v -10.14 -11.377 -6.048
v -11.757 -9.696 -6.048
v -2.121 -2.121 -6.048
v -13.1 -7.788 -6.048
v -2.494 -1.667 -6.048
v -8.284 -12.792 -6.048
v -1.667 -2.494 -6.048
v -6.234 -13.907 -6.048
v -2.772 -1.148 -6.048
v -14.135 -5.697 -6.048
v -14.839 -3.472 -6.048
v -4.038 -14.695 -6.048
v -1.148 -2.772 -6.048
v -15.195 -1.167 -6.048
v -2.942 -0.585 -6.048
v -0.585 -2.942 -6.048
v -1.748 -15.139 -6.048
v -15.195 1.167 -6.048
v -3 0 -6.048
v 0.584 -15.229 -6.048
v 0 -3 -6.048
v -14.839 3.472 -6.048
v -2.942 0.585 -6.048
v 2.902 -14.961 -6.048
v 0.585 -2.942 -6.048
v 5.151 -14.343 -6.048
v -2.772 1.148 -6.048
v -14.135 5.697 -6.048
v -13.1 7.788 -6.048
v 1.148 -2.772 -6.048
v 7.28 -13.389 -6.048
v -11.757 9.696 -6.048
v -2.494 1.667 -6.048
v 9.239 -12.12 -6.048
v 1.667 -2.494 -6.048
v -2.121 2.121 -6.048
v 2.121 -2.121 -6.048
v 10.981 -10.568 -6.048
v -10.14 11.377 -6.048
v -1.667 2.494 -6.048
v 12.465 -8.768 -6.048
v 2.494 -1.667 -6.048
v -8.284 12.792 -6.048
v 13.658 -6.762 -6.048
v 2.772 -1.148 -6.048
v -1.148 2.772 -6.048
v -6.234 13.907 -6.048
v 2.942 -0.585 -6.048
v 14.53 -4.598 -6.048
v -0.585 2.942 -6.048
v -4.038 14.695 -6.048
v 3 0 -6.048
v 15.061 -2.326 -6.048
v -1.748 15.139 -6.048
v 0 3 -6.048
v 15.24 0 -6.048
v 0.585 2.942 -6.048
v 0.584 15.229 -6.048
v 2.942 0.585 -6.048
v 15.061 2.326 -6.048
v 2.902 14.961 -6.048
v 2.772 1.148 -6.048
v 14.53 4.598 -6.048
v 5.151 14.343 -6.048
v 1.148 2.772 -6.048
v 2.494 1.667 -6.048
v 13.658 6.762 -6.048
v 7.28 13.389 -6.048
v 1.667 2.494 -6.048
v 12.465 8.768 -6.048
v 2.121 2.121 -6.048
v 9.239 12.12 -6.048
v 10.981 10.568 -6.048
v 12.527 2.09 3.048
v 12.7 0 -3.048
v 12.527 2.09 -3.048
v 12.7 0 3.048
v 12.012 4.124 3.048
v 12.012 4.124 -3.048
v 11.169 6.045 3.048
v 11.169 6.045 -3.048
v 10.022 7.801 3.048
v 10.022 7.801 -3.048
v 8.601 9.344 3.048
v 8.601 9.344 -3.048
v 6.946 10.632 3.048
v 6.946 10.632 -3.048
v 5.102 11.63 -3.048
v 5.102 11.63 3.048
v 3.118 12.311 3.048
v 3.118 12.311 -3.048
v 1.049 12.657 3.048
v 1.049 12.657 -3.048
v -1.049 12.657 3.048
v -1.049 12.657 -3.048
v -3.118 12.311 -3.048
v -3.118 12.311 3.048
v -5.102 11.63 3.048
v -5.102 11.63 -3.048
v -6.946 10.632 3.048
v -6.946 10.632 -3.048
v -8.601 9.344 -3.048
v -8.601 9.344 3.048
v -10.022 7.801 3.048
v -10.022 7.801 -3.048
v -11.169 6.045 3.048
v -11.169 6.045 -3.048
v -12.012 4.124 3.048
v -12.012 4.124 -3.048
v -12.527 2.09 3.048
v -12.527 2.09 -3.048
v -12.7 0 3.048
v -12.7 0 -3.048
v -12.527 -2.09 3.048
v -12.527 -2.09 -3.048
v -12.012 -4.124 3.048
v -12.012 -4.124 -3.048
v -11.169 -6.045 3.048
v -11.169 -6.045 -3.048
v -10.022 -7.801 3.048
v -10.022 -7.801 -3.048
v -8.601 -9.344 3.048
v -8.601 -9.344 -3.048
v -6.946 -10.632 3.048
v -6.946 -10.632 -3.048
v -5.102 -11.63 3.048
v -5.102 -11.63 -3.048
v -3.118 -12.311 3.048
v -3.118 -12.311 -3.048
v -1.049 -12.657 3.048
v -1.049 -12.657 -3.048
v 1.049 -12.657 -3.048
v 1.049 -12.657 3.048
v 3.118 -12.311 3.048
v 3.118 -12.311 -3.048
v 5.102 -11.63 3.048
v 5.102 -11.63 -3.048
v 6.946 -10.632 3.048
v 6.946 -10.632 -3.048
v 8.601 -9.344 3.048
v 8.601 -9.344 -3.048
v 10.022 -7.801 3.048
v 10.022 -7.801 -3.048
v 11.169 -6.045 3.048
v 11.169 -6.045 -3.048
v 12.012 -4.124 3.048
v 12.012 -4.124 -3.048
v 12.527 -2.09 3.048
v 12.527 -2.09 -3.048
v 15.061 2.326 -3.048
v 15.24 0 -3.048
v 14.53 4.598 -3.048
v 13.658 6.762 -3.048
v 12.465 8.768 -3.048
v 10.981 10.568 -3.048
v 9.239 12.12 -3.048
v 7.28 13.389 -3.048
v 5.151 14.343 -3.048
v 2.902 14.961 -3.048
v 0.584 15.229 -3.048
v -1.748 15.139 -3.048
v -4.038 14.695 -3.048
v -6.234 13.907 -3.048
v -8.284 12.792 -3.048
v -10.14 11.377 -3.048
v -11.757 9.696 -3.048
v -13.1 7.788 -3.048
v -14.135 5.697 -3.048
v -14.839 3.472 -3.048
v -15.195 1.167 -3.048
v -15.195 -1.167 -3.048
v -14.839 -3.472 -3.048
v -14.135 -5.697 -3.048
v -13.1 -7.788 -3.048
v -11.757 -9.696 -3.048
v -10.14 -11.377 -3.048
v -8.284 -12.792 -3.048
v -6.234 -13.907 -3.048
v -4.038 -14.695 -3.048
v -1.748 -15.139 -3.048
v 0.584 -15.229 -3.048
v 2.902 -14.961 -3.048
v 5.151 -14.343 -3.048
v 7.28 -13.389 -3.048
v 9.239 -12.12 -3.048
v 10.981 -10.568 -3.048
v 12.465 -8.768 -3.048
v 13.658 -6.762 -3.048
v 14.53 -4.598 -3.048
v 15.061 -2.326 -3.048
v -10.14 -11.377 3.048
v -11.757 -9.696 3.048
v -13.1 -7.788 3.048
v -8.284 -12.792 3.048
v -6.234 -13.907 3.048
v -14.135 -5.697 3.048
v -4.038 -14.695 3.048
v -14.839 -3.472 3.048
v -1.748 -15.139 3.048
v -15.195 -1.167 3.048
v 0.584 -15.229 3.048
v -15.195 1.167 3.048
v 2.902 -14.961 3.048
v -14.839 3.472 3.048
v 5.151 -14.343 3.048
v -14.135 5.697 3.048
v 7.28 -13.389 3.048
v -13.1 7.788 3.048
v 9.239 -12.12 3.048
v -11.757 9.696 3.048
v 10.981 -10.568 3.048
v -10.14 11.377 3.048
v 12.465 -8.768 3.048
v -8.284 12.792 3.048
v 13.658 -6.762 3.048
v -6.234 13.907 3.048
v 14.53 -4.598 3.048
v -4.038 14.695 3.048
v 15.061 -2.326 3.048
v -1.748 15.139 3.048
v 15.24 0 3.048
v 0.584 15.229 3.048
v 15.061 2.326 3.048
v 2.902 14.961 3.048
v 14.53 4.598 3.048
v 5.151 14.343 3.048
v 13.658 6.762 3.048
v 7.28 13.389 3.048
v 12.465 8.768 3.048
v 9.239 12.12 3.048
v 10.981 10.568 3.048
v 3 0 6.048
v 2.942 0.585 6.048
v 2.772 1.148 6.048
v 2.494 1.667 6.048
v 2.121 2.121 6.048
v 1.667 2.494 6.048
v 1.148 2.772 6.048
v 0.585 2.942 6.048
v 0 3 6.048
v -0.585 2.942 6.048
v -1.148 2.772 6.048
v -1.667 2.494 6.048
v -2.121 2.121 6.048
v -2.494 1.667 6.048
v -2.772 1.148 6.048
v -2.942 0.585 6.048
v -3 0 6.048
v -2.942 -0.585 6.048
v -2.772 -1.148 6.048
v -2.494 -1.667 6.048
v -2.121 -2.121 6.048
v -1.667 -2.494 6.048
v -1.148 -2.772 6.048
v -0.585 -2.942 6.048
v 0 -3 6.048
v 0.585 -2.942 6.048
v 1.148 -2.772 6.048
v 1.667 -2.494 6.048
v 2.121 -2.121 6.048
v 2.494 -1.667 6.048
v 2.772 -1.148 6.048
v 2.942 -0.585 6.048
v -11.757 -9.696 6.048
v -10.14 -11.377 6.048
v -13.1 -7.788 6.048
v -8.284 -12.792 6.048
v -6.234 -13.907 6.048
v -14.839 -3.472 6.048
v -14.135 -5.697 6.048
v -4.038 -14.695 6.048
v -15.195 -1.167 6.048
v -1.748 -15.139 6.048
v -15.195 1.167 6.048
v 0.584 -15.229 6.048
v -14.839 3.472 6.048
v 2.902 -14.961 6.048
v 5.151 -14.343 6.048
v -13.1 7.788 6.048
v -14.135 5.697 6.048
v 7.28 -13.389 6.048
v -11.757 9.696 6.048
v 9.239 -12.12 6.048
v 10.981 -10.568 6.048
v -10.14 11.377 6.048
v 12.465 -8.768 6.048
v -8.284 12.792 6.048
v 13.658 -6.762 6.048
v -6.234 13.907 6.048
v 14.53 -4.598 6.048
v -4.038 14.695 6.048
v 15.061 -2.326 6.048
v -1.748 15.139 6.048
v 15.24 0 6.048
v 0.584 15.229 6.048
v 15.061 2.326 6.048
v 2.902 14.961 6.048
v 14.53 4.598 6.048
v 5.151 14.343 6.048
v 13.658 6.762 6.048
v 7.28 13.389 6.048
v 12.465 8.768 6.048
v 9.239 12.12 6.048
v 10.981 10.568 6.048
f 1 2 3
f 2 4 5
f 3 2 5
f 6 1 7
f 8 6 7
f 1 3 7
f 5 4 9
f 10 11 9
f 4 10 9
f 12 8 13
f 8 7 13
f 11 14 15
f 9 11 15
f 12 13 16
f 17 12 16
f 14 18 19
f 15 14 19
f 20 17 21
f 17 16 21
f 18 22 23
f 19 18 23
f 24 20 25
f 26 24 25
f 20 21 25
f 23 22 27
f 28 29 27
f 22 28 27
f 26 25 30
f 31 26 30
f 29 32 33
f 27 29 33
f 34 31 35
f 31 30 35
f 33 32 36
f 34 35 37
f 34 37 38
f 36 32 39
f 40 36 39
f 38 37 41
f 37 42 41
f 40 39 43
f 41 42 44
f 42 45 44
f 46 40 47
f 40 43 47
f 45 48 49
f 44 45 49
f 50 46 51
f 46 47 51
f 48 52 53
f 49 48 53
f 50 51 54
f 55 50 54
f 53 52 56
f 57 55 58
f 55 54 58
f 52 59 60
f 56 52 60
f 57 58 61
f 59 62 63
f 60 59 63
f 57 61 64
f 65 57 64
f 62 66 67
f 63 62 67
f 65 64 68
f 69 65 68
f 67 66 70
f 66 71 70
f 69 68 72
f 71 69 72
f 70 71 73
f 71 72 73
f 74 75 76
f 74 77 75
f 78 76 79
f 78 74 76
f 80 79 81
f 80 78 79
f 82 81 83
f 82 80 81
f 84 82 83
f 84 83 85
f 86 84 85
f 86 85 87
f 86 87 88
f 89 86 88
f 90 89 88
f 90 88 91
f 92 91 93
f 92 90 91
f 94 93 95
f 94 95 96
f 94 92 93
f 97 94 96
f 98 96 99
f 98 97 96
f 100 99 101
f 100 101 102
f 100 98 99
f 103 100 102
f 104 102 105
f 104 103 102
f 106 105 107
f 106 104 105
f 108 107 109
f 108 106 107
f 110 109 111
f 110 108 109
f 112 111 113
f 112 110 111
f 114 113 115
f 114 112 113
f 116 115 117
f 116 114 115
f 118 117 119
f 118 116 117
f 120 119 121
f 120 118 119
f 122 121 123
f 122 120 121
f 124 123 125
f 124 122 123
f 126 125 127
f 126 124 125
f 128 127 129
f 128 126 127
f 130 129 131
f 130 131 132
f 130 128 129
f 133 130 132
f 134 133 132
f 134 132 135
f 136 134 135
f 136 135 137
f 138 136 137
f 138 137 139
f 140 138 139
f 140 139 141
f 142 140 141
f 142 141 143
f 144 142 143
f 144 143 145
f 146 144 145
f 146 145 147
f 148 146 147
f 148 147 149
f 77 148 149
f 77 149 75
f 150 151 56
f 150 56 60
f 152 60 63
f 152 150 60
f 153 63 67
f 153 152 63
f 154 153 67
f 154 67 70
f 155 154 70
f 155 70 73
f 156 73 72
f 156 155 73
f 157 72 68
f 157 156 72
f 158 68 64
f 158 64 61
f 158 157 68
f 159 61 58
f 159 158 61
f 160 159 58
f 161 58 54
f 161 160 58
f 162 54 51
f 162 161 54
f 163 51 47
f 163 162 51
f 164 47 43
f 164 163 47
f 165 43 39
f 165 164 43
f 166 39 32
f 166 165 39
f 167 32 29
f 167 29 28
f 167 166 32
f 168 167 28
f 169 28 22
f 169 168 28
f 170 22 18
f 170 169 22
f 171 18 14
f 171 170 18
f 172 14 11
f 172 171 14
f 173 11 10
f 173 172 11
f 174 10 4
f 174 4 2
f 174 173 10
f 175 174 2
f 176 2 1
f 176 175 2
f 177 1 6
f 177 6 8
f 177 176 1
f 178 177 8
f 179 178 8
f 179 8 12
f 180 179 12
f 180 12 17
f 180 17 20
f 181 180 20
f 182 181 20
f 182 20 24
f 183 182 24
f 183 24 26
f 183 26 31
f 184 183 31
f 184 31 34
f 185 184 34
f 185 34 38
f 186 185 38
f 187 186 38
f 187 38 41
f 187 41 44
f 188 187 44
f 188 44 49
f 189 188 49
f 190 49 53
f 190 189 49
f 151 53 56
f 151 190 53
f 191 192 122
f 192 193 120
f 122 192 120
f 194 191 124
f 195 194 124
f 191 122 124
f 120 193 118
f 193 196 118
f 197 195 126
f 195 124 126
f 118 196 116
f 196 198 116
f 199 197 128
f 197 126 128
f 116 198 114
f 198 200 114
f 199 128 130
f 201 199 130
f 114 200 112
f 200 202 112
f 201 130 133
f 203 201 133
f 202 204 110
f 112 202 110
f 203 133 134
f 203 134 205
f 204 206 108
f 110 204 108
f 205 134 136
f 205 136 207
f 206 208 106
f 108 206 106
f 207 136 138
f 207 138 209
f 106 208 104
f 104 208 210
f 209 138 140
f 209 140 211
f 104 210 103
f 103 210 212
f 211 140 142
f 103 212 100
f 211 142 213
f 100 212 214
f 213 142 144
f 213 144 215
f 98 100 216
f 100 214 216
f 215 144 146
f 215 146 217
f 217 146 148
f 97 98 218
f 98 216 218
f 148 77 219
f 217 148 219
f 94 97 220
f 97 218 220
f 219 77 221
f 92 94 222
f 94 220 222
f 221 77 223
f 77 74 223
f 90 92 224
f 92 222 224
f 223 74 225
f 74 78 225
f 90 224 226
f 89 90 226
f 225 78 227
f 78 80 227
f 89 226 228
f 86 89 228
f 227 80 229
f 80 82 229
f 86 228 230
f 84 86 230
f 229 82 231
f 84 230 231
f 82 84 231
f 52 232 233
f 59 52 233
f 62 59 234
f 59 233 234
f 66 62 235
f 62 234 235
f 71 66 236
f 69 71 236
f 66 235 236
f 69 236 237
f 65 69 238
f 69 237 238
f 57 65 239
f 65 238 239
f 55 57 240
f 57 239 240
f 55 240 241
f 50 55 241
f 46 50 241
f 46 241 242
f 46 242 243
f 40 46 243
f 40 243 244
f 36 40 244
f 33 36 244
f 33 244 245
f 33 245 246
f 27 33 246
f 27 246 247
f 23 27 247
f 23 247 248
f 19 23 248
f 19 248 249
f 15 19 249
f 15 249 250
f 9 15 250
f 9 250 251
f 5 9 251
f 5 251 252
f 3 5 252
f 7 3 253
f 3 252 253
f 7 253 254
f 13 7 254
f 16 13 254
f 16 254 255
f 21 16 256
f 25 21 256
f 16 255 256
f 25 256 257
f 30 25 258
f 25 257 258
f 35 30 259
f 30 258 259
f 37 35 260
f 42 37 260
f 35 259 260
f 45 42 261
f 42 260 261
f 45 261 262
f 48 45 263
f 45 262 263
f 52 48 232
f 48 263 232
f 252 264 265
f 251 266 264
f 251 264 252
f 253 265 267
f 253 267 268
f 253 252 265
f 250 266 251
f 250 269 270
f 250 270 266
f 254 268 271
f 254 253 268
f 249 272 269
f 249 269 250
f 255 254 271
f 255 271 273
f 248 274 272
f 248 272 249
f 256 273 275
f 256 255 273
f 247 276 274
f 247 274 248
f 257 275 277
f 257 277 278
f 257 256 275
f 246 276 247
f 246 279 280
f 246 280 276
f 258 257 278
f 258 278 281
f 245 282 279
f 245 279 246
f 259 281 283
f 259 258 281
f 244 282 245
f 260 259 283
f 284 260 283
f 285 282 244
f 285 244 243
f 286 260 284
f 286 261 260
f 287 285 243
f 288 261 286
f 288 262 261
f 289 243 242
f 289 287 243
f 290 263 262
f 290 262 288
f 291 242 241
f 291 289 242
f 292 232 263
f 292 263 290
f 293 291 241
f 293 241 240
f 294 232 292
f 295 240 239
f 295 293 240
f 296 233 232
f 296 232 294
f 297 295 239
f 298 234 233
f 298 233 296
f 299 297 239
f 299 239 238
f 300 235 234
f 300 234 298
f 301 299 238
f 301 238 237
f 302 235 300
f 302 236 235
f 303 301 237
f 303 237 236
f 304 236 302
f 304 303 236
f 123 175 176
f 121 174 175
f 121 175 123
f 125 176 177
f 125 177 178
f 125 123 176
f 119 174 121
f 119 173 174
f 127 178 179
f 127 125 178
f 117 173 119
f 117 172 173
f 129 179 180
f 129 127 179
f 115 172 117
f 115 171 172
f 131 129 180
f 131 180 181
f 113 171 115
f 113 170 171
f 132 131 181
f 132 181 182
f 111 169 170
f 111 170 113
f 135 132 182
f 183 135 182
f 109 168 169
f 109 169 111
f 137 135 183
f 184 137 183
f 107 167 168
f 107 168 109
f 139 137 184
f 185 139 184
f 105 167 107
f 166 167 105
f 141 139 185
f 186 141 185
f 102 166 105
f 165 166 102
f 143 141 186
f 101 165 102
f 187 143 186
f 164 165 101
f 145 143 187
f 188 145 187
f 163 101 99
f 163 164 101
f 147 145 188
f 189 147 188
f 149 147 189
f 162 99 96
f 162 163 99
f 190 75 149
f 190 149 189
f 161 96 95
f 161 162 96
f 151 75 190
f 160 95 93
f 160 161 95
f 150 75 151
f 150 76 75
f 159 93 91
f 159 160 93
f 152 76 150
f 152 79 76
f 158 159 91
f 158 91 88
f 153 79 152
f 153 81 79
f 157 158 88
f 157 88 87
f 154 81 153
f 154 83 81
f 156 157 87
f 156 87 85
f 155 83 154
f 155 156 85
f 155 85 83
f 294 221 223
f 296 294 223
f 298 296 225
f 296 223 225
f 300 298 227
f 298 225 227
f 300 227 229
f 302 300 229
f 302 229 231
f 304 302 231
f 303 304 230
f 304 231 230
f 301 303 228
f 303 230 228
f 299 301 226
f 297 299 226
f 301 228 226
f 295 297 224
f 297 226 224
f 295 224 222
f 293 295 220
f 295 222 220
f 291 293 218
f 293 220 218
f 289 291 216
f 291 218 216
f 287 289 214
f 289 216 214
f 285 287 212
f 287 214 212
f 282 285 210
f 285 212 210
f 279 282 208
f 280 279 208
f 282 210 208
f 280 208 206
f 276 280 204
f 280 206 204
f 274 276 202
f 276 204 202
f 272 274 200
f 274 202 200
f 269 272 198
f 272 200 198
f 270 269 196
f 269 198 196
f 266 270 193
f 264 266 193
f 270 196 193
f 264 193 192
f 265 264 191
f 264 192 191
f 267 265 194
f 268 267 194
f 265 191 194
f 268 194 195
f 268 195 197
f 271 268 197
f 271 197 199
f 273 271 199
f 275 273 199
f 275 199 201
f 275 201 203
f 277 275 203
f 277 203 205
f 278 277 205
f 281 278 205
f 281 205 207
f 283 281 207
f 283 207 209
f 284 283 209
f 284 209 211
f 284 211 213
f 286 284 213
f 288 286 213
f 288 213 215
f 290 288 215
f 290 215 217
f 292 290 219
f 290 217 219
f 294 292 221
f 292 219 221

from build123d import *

# Parameters (mm, degrees)
SKETCH1_R           = 12.7
BOSS_EXTRUDE1_DEPTH = 3.048
SKETCH2_R           = 15.24
BOSS_EXTRUDE2_DEPTH = 3
SKETCH3_R           = 3
CUT_EXTRUDE1_DEPTH  = 25.606


with BuildPart() as part:
    # Sketch1 → Boss-Extrude1 (new body, symmetric)
    with BuildSketch(Plane.XY):
        Circle(SKETCH1_R)
    extrude(amount=BOSS_EXTRUDE1_DEPTH, both=True)

    # Sketch2 → Boss-Extrude2 (add)
    with BuildSketch(Plane.XY.offset(3.048)):
        Circle(SKETCH2_R)
    boss_extrude2 = extrude(amount=BOSS_EXTRUDE2_DEPTH)

    # Mirror1: Boss-Extrude2 across plane
    add(boss_extrude2.mirror(Plane.XY))

    # Sketch3 → Cut-Extrude1 (cut)
    with BuildSketch(Plane.XY.offset(6.048)):
        Circle(SKETCH3_R)
    extrude(amount=-CUT_EXTRUDE1_DEPTH, mode=Mode.SUBTRACT)


solid = part.part
